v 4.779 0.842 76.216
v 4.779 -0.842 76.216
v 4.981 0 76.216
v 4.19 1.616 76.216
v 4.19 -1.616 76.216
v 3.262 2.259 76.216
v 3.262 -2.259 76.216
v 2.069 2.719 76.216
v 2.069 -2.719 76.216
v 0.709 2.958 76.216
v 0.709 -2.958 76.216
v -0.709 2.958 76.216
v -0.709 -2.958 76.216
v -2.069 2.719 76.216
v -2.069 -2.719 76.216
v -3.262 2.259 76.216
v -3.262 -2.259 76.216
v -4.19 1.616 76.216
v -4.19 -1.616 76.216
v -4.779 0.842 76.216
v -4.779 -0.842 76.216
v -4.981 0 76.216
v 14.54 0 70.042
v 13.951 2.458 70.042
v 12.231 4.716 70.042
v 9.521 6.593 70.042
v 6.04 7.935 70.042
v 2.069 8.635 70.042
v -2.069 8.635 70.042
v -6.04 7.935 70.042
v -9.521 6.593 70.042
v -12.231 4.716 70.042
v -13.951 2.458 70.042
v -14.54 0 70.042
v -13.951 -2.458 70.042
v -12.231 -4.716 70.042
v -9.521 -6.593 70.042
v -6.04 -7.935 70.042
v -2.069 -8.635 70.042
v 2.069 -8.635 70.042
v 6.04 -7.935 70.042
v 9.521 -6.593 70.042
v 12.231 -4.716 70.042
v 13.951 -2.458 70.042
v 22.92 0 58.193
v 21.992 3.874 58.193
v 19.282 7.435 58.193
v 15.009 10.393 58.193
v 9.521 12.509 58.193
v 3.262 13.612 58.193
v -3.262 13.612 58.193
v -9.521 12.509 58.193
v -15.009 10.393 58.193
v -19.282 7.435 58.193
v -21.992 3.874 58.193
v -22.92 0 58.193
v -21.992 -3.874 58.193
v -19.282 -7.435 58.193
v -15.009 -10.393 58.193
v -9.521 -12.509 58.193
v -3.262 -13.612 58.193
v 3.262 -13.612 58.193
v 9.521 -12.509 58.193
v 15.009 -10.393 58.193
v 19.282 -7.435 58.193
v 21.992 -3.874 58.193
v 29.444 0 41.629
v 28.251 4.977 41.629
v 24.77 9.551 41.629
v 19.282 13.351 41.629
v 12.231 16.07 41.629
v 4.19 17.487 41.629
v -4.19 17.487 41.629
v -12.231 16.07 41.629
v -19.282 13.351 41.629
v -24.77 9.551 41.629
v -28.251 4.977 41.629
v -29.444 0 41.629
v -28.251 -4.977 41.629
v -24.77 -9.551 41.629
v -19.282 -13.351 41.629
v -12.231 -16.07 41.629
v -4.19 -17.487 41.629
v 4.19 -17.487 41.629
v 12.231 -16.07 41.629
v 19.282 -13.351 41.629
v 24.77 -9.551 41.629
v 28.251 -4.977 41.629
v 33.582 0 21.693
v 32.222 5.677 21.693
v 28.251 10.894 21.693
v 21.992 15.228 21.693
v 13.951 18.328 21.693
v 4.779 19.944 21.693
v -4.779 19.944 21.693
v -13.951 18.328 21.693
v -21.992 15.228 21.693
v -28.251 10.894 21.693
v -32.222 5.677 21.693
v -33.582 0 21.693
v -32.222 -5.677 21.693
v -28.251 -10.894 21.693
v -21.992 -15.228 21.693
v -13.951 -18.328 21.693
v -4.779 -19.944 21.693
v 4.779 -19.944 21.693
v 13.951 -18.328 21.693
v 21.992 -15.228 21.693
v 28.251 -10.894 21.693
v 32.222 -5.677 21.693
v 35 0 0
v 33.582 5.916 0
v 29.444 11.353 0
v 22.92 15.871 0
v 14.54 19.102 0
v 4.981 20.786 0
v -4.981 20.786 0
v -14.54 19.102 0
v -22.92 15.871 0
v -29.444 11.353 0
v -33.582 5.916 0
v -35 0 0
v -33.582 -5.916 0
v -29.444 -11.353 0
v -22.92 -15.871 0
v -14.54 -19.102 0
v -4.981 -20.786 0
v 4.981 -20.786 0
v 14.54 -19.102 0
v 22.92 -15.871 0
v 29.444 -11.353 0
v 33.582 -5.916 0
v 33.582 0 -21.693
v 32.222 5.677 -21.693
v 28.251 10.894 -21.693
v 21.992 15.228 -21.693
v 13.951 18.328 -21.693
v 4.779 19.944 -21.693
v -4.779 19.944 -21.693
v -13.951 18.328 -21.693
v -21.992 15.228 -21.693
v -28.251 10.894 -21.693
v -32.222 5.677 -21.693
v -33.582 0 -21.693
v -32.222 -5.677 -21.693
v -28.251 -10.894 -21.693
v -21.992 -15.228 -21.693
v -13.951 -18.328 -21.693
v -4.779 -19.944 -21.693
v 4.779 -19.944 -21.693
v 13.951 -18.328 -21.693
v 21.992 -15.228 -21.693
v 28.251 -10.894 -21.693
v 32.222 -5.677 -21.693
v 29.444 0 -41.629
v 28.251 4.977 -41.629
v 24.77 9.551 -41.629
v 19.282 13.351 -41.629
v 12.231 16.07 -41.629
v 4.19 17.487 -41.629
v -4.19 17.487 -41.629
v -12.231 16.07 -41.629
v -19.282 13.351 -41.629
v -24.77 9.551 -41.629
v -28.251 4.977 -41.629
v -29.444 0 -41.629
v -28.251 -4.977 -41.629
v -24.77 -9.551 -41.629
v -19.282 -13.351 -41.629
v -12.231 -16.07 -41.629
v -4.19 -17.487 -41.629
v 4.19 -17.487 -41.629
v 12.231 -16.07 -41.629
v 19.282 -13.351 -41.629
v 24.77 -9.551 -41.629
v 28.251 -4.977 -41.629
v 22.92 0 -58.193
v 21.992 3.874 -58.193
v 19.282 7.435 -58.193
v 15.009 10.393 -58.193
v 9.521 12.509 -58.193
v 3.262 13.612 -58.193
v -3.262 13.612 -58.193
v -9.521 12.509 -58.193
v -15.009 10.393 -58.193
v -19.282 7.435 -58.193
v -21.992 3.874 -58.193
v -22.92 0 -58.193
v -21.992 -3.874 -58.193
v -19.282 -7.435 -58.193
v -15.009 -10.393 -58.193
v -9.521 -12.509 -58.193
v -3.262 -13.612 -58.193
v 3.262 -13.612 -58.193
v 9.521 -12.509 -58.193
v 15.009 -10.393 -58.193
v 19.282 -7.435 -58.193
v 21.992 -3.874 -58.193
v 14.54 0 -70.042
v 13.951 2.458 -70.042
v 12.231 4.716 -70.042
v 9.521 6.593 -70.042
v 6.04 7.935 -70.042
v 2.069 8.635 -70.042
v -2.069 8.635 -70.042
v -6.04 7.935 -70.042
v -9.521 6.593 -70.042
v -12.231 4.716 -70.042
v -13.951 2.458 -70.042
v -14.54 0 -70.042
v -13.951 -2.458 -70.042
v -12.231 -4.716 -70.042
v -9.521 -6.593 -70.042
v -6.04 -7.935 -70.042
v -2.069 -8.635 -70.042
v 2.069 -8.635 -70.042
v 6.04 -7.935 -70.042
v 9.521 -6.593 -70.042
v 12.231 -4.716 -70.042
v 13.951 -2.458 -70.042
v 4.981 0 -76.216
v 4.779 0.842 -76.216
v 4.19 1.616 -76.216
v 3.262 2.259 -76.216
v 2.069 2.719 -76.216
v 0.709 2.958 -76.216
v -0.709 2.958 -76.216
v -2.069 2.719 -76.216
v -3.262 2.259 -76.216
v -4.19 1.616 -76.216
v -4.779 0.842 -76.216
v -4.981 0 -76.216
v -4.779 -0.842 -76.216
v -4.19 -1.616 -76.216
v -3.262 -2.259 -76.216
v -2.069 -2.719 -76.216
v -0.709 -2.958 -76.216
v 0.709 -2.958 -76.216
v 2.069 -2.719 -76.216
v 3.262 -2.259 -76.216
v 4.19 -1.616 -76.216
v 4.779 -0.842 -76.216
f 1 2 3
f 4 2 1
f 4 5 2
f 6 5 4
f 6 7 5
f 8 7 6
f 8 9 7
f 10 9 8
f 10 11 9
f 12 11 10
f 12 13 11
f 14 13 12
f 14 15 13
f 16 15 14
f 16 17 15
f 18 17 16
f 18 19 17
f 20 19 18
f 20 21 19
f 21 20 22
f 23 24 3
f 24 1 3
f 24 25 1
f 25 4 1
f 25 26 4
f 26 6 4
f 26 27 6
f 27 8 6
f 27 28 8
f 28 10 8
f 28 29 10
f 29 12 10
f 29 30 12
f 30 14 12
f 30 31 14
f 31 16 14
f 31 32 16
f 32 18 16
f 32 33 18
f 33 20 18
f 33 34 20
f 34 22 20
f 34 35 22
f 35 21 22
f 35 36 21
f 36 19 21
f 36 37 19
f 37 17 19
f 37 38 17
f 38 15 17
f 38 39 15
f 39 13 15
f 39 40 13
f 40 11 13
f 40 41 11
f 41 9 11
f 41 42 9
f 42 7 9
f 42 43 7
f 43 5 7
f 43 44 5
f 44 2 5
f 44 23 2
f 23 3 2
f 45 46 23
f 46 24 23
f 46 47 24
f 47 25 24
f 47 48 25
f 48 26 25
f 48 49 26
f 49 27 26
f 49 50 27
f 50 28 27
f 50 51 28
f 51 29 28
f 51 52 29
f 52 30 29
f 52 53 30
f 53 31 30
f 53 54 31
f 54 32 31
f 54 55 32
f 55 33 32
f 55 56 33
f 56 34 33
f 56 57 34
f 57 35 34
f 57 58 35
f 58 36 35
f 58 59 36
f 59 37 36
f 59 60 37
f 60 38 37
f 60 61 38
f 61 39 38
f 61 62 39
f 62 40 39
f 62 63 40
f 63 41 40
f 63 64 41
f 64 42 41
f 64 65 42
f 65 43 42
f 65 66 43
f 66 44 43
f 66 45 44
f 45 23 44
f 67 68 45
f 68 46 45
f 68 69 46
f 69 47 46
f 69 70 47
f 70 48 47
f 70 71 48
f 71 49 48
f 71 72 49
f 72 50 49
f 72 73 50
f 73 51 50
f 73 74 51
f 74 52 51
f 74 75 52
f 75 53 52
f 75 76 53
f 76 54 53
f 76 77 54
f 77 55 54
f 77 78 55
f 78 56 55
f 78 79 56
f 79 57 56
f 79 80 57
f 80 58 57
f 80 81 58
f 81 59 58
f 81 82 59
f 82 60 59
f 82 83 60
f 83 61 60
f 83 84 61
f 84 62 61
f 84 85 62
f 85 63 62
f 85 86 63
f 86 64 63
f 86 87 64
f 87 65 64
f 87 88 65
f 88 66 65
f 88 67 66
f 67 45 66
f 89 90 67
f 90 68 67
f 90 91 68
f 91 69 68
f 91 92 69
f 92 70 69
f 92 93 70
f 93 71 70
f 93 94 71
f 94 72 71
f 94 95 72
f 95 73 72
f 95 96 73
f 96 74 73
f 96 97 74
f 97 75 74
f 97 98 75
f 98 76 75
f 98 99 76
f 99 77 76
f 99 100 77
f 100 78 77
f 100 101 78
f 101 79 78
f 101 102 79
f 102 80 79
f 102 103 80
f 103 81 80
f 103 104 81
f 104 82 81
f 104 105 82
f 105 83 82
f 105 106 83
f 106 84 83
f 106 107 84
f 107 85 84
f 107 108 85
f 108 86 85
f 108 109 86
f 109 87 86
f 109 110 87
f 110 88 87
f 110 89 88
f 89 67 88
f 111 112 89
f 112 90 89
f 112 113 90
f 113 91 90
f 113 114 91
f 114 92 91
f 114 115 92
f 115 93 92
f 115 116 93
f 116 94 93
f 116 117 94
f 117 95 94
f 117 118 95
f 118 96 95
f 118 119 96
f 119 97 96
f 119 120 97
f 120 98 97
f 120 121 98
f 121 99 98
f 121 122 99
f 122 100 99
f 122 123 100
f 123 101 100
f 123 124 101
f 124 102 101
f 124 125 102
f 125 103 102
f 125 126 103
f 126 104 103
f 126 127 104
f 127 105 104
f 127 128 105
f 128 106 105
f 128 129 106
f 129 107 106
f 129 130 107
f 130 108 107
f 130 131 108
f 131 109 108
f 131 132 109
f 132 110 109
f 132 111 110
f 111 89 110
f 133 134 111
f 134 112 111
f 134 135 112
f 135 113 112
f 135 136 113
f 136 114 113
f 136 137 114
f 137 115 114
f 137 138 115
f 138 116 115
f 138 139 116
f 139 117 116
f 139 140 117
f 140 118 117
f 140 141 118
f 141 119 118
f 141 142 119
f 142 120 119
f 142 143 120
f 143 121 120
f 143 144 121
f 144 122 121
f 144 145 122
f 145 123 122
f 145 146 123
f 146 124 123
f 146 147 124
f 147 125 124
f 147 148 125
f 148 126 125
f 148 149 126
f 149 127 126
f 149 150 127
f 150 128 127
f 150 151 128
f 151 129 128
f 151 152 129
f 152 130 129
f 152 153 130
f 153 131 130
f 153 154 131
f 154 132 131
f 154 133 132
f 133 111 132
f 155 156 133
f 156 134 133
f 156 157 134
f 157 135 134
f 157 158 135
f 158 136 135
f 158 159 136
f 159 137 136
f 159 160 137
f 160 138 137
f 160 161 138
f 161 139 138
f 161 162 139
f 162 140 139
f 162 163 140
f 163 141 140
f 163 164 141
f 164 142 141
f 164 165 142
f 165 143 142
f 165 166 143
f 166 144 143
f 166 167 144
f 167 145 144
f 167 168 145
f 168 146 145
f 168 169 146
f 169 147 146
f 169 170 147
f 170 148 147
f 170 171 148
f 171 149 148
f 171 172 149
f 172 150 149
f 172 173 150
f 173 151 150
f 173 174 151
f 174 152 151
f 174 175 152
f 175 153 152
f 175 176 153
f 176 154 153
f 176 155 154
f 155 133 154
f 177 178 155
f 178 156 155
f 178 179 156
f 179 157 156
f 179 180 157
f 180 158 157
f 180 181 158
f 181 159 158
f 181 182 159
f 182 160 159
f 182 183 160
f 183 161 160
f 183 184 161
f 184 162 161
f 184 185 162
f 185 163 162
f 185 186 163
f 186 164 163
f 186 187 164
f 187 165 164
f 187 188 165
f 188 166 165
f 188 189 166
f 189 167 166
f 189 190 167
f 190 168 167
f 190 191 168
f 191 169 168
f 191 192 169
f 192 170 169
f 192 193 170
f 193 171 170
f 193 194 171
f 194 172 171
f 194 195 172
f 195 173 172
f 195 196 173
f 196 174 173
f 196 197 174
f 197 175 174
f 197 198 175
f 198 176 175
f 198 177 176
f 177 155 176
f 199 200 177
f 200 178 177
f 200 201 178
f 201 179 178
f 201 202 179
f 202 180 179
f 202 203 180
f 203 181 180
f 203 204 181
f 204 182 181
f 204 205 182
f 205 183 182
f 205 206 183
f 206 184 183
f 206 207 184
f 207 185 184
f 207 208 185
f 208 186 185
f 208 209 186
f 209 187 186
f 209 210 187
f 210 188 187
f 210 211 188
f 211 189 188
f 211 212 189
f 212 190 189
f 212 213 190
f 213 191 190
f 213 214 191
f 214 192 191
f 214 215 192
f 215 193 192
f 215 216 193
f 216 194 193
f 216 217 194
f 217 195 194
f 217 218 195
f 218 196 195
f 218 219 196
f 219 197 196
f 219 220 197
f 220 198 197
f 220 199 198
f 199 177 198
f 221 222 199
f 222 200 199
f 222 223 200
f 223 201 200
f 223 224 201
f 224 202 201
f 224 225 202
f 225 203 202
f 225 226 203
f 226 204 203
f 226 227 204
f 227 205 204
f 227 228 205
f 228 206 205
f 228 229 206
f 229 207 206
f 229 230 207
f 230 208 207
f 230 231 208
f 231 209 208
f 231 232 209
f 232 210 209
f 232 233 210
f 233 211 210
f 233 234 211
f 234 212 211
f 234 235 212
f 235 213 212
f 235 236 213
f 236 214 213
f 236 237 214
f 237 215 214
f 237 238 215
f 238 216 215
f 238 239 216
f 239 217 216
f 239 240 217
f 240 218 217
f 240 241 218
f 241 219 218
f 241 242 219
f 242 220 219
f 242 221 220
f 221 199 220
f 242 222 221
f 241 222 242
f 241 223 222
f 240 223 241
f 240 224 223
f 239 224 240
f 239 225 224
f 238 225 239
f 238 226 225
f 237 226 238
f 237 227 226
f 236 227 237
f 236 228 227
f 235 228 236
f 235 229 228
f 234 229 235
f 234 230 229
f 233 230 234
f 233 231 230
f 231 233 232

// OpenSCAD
// Generated by SolidPython 1.0.1 on 2020-07-29 00:46:46


scale(v = [5, 3, 11]) {
	sphere(r = 7);
}
/***********************************************
*********      SolidPython code:      **********
************************************************
 
# import packages: SolidPython
from solid import *
from solid.utils import *
from itertools import chain, combinations, permutations


class Resize:

    def __init__(self, scad_file):
        self.scad_file = scad_file
        #self.scad_file = import_scad(scad_file)
        # cone/cylinder param:
        self.r1 = 0
        self.r2 = 0
        self.h = 0
        # rectangular prism param:
        self.w = 0
        self.l = 0
        # ellipse param:
        self.r = 0

    # import OpenScad code (file name corresponds to shape)


    # classify shape + parameters
    def assign(self, param1, param2, param3):
        if self.scad_file == 'cone.scad':
            self.r1 = param1
            self.r2 = param2
            self.h = param3
        elif self.scad_file == 'cylinder.scad':
            self.r1 = param1
            self.r2 = param2
            self.h = param3
        elif self.scad_file == 'rectangularPrism.scad':
            self.h = param1
            self.l = param2
            self.w = param3
        else:
            self.r = param1
            self.h = param2

    # resize parameters
    def iterate(self):
        x = range(3, 20, 2)
        i = 1
        if self.scad_file == 'cone.scad':
            tempList = list(permutations(x, 2))
            for temp in tempList:
                param1 = temp[0]
                param2 = temp[1]
                filepath = 'produced_scad_files/' + 'cone' + str(param1) + '_' + str(param2) + '_' + '.scad'
                scad_render_to_file(cylinder(h=param1, r1=param2, r2=0), filepath)

        elif self.scad_file == 'cylinder.scad':
            tempList = list(permutations(x, 3))
            for temp in tempList:
                param1 = temp[0]
                param2 = temp[1]
                filepath = 'produced_scad_files/' + 'cylinder' + str(param1) + '_' + str(param2) + '_' + '.scad'
                scad_render_to_file(cylinder(h=param1, r1=param2, r2=param2), filepath)

        elif self.scad_file == 'rectangularPrism.scad':
            tempList = list(permutations(x, 3))
            for temp in tempList:
                param1 = temp[0]
                param2 = temp[1]
                param3 = temp[2]
                filepath = 'produced_scad_files/' + 'rectangularPrism' + str(param1) + '_' + str(param2) + '_' + str(
                    param3) + '.scad'
                scad_render_to_file(cube(size=(param1, param2, param3)), filepath)

        elif self.scad_file == 'ellipse.scad':
            tempList = list(permutations(x, 4))
            for temp in tempList:
                param1 = temp[0]
                param2 = temp[1]
                param3 = temp[2]
                param4 = temp[3]
                filepath = 'produced_scad_files/' + 'ellipse' + str(param1) + '_' + str(param2) + '_' + str(param3) + '_' + str(param4) + '.scad'
                scad_render_to_file(scale([param1, param2, param3])(sphere(r=param4)), filepath)

    def render_to_scadfile(self):
        scad_render_to_file(scad, 'example.scad') 
 
************************************************/
